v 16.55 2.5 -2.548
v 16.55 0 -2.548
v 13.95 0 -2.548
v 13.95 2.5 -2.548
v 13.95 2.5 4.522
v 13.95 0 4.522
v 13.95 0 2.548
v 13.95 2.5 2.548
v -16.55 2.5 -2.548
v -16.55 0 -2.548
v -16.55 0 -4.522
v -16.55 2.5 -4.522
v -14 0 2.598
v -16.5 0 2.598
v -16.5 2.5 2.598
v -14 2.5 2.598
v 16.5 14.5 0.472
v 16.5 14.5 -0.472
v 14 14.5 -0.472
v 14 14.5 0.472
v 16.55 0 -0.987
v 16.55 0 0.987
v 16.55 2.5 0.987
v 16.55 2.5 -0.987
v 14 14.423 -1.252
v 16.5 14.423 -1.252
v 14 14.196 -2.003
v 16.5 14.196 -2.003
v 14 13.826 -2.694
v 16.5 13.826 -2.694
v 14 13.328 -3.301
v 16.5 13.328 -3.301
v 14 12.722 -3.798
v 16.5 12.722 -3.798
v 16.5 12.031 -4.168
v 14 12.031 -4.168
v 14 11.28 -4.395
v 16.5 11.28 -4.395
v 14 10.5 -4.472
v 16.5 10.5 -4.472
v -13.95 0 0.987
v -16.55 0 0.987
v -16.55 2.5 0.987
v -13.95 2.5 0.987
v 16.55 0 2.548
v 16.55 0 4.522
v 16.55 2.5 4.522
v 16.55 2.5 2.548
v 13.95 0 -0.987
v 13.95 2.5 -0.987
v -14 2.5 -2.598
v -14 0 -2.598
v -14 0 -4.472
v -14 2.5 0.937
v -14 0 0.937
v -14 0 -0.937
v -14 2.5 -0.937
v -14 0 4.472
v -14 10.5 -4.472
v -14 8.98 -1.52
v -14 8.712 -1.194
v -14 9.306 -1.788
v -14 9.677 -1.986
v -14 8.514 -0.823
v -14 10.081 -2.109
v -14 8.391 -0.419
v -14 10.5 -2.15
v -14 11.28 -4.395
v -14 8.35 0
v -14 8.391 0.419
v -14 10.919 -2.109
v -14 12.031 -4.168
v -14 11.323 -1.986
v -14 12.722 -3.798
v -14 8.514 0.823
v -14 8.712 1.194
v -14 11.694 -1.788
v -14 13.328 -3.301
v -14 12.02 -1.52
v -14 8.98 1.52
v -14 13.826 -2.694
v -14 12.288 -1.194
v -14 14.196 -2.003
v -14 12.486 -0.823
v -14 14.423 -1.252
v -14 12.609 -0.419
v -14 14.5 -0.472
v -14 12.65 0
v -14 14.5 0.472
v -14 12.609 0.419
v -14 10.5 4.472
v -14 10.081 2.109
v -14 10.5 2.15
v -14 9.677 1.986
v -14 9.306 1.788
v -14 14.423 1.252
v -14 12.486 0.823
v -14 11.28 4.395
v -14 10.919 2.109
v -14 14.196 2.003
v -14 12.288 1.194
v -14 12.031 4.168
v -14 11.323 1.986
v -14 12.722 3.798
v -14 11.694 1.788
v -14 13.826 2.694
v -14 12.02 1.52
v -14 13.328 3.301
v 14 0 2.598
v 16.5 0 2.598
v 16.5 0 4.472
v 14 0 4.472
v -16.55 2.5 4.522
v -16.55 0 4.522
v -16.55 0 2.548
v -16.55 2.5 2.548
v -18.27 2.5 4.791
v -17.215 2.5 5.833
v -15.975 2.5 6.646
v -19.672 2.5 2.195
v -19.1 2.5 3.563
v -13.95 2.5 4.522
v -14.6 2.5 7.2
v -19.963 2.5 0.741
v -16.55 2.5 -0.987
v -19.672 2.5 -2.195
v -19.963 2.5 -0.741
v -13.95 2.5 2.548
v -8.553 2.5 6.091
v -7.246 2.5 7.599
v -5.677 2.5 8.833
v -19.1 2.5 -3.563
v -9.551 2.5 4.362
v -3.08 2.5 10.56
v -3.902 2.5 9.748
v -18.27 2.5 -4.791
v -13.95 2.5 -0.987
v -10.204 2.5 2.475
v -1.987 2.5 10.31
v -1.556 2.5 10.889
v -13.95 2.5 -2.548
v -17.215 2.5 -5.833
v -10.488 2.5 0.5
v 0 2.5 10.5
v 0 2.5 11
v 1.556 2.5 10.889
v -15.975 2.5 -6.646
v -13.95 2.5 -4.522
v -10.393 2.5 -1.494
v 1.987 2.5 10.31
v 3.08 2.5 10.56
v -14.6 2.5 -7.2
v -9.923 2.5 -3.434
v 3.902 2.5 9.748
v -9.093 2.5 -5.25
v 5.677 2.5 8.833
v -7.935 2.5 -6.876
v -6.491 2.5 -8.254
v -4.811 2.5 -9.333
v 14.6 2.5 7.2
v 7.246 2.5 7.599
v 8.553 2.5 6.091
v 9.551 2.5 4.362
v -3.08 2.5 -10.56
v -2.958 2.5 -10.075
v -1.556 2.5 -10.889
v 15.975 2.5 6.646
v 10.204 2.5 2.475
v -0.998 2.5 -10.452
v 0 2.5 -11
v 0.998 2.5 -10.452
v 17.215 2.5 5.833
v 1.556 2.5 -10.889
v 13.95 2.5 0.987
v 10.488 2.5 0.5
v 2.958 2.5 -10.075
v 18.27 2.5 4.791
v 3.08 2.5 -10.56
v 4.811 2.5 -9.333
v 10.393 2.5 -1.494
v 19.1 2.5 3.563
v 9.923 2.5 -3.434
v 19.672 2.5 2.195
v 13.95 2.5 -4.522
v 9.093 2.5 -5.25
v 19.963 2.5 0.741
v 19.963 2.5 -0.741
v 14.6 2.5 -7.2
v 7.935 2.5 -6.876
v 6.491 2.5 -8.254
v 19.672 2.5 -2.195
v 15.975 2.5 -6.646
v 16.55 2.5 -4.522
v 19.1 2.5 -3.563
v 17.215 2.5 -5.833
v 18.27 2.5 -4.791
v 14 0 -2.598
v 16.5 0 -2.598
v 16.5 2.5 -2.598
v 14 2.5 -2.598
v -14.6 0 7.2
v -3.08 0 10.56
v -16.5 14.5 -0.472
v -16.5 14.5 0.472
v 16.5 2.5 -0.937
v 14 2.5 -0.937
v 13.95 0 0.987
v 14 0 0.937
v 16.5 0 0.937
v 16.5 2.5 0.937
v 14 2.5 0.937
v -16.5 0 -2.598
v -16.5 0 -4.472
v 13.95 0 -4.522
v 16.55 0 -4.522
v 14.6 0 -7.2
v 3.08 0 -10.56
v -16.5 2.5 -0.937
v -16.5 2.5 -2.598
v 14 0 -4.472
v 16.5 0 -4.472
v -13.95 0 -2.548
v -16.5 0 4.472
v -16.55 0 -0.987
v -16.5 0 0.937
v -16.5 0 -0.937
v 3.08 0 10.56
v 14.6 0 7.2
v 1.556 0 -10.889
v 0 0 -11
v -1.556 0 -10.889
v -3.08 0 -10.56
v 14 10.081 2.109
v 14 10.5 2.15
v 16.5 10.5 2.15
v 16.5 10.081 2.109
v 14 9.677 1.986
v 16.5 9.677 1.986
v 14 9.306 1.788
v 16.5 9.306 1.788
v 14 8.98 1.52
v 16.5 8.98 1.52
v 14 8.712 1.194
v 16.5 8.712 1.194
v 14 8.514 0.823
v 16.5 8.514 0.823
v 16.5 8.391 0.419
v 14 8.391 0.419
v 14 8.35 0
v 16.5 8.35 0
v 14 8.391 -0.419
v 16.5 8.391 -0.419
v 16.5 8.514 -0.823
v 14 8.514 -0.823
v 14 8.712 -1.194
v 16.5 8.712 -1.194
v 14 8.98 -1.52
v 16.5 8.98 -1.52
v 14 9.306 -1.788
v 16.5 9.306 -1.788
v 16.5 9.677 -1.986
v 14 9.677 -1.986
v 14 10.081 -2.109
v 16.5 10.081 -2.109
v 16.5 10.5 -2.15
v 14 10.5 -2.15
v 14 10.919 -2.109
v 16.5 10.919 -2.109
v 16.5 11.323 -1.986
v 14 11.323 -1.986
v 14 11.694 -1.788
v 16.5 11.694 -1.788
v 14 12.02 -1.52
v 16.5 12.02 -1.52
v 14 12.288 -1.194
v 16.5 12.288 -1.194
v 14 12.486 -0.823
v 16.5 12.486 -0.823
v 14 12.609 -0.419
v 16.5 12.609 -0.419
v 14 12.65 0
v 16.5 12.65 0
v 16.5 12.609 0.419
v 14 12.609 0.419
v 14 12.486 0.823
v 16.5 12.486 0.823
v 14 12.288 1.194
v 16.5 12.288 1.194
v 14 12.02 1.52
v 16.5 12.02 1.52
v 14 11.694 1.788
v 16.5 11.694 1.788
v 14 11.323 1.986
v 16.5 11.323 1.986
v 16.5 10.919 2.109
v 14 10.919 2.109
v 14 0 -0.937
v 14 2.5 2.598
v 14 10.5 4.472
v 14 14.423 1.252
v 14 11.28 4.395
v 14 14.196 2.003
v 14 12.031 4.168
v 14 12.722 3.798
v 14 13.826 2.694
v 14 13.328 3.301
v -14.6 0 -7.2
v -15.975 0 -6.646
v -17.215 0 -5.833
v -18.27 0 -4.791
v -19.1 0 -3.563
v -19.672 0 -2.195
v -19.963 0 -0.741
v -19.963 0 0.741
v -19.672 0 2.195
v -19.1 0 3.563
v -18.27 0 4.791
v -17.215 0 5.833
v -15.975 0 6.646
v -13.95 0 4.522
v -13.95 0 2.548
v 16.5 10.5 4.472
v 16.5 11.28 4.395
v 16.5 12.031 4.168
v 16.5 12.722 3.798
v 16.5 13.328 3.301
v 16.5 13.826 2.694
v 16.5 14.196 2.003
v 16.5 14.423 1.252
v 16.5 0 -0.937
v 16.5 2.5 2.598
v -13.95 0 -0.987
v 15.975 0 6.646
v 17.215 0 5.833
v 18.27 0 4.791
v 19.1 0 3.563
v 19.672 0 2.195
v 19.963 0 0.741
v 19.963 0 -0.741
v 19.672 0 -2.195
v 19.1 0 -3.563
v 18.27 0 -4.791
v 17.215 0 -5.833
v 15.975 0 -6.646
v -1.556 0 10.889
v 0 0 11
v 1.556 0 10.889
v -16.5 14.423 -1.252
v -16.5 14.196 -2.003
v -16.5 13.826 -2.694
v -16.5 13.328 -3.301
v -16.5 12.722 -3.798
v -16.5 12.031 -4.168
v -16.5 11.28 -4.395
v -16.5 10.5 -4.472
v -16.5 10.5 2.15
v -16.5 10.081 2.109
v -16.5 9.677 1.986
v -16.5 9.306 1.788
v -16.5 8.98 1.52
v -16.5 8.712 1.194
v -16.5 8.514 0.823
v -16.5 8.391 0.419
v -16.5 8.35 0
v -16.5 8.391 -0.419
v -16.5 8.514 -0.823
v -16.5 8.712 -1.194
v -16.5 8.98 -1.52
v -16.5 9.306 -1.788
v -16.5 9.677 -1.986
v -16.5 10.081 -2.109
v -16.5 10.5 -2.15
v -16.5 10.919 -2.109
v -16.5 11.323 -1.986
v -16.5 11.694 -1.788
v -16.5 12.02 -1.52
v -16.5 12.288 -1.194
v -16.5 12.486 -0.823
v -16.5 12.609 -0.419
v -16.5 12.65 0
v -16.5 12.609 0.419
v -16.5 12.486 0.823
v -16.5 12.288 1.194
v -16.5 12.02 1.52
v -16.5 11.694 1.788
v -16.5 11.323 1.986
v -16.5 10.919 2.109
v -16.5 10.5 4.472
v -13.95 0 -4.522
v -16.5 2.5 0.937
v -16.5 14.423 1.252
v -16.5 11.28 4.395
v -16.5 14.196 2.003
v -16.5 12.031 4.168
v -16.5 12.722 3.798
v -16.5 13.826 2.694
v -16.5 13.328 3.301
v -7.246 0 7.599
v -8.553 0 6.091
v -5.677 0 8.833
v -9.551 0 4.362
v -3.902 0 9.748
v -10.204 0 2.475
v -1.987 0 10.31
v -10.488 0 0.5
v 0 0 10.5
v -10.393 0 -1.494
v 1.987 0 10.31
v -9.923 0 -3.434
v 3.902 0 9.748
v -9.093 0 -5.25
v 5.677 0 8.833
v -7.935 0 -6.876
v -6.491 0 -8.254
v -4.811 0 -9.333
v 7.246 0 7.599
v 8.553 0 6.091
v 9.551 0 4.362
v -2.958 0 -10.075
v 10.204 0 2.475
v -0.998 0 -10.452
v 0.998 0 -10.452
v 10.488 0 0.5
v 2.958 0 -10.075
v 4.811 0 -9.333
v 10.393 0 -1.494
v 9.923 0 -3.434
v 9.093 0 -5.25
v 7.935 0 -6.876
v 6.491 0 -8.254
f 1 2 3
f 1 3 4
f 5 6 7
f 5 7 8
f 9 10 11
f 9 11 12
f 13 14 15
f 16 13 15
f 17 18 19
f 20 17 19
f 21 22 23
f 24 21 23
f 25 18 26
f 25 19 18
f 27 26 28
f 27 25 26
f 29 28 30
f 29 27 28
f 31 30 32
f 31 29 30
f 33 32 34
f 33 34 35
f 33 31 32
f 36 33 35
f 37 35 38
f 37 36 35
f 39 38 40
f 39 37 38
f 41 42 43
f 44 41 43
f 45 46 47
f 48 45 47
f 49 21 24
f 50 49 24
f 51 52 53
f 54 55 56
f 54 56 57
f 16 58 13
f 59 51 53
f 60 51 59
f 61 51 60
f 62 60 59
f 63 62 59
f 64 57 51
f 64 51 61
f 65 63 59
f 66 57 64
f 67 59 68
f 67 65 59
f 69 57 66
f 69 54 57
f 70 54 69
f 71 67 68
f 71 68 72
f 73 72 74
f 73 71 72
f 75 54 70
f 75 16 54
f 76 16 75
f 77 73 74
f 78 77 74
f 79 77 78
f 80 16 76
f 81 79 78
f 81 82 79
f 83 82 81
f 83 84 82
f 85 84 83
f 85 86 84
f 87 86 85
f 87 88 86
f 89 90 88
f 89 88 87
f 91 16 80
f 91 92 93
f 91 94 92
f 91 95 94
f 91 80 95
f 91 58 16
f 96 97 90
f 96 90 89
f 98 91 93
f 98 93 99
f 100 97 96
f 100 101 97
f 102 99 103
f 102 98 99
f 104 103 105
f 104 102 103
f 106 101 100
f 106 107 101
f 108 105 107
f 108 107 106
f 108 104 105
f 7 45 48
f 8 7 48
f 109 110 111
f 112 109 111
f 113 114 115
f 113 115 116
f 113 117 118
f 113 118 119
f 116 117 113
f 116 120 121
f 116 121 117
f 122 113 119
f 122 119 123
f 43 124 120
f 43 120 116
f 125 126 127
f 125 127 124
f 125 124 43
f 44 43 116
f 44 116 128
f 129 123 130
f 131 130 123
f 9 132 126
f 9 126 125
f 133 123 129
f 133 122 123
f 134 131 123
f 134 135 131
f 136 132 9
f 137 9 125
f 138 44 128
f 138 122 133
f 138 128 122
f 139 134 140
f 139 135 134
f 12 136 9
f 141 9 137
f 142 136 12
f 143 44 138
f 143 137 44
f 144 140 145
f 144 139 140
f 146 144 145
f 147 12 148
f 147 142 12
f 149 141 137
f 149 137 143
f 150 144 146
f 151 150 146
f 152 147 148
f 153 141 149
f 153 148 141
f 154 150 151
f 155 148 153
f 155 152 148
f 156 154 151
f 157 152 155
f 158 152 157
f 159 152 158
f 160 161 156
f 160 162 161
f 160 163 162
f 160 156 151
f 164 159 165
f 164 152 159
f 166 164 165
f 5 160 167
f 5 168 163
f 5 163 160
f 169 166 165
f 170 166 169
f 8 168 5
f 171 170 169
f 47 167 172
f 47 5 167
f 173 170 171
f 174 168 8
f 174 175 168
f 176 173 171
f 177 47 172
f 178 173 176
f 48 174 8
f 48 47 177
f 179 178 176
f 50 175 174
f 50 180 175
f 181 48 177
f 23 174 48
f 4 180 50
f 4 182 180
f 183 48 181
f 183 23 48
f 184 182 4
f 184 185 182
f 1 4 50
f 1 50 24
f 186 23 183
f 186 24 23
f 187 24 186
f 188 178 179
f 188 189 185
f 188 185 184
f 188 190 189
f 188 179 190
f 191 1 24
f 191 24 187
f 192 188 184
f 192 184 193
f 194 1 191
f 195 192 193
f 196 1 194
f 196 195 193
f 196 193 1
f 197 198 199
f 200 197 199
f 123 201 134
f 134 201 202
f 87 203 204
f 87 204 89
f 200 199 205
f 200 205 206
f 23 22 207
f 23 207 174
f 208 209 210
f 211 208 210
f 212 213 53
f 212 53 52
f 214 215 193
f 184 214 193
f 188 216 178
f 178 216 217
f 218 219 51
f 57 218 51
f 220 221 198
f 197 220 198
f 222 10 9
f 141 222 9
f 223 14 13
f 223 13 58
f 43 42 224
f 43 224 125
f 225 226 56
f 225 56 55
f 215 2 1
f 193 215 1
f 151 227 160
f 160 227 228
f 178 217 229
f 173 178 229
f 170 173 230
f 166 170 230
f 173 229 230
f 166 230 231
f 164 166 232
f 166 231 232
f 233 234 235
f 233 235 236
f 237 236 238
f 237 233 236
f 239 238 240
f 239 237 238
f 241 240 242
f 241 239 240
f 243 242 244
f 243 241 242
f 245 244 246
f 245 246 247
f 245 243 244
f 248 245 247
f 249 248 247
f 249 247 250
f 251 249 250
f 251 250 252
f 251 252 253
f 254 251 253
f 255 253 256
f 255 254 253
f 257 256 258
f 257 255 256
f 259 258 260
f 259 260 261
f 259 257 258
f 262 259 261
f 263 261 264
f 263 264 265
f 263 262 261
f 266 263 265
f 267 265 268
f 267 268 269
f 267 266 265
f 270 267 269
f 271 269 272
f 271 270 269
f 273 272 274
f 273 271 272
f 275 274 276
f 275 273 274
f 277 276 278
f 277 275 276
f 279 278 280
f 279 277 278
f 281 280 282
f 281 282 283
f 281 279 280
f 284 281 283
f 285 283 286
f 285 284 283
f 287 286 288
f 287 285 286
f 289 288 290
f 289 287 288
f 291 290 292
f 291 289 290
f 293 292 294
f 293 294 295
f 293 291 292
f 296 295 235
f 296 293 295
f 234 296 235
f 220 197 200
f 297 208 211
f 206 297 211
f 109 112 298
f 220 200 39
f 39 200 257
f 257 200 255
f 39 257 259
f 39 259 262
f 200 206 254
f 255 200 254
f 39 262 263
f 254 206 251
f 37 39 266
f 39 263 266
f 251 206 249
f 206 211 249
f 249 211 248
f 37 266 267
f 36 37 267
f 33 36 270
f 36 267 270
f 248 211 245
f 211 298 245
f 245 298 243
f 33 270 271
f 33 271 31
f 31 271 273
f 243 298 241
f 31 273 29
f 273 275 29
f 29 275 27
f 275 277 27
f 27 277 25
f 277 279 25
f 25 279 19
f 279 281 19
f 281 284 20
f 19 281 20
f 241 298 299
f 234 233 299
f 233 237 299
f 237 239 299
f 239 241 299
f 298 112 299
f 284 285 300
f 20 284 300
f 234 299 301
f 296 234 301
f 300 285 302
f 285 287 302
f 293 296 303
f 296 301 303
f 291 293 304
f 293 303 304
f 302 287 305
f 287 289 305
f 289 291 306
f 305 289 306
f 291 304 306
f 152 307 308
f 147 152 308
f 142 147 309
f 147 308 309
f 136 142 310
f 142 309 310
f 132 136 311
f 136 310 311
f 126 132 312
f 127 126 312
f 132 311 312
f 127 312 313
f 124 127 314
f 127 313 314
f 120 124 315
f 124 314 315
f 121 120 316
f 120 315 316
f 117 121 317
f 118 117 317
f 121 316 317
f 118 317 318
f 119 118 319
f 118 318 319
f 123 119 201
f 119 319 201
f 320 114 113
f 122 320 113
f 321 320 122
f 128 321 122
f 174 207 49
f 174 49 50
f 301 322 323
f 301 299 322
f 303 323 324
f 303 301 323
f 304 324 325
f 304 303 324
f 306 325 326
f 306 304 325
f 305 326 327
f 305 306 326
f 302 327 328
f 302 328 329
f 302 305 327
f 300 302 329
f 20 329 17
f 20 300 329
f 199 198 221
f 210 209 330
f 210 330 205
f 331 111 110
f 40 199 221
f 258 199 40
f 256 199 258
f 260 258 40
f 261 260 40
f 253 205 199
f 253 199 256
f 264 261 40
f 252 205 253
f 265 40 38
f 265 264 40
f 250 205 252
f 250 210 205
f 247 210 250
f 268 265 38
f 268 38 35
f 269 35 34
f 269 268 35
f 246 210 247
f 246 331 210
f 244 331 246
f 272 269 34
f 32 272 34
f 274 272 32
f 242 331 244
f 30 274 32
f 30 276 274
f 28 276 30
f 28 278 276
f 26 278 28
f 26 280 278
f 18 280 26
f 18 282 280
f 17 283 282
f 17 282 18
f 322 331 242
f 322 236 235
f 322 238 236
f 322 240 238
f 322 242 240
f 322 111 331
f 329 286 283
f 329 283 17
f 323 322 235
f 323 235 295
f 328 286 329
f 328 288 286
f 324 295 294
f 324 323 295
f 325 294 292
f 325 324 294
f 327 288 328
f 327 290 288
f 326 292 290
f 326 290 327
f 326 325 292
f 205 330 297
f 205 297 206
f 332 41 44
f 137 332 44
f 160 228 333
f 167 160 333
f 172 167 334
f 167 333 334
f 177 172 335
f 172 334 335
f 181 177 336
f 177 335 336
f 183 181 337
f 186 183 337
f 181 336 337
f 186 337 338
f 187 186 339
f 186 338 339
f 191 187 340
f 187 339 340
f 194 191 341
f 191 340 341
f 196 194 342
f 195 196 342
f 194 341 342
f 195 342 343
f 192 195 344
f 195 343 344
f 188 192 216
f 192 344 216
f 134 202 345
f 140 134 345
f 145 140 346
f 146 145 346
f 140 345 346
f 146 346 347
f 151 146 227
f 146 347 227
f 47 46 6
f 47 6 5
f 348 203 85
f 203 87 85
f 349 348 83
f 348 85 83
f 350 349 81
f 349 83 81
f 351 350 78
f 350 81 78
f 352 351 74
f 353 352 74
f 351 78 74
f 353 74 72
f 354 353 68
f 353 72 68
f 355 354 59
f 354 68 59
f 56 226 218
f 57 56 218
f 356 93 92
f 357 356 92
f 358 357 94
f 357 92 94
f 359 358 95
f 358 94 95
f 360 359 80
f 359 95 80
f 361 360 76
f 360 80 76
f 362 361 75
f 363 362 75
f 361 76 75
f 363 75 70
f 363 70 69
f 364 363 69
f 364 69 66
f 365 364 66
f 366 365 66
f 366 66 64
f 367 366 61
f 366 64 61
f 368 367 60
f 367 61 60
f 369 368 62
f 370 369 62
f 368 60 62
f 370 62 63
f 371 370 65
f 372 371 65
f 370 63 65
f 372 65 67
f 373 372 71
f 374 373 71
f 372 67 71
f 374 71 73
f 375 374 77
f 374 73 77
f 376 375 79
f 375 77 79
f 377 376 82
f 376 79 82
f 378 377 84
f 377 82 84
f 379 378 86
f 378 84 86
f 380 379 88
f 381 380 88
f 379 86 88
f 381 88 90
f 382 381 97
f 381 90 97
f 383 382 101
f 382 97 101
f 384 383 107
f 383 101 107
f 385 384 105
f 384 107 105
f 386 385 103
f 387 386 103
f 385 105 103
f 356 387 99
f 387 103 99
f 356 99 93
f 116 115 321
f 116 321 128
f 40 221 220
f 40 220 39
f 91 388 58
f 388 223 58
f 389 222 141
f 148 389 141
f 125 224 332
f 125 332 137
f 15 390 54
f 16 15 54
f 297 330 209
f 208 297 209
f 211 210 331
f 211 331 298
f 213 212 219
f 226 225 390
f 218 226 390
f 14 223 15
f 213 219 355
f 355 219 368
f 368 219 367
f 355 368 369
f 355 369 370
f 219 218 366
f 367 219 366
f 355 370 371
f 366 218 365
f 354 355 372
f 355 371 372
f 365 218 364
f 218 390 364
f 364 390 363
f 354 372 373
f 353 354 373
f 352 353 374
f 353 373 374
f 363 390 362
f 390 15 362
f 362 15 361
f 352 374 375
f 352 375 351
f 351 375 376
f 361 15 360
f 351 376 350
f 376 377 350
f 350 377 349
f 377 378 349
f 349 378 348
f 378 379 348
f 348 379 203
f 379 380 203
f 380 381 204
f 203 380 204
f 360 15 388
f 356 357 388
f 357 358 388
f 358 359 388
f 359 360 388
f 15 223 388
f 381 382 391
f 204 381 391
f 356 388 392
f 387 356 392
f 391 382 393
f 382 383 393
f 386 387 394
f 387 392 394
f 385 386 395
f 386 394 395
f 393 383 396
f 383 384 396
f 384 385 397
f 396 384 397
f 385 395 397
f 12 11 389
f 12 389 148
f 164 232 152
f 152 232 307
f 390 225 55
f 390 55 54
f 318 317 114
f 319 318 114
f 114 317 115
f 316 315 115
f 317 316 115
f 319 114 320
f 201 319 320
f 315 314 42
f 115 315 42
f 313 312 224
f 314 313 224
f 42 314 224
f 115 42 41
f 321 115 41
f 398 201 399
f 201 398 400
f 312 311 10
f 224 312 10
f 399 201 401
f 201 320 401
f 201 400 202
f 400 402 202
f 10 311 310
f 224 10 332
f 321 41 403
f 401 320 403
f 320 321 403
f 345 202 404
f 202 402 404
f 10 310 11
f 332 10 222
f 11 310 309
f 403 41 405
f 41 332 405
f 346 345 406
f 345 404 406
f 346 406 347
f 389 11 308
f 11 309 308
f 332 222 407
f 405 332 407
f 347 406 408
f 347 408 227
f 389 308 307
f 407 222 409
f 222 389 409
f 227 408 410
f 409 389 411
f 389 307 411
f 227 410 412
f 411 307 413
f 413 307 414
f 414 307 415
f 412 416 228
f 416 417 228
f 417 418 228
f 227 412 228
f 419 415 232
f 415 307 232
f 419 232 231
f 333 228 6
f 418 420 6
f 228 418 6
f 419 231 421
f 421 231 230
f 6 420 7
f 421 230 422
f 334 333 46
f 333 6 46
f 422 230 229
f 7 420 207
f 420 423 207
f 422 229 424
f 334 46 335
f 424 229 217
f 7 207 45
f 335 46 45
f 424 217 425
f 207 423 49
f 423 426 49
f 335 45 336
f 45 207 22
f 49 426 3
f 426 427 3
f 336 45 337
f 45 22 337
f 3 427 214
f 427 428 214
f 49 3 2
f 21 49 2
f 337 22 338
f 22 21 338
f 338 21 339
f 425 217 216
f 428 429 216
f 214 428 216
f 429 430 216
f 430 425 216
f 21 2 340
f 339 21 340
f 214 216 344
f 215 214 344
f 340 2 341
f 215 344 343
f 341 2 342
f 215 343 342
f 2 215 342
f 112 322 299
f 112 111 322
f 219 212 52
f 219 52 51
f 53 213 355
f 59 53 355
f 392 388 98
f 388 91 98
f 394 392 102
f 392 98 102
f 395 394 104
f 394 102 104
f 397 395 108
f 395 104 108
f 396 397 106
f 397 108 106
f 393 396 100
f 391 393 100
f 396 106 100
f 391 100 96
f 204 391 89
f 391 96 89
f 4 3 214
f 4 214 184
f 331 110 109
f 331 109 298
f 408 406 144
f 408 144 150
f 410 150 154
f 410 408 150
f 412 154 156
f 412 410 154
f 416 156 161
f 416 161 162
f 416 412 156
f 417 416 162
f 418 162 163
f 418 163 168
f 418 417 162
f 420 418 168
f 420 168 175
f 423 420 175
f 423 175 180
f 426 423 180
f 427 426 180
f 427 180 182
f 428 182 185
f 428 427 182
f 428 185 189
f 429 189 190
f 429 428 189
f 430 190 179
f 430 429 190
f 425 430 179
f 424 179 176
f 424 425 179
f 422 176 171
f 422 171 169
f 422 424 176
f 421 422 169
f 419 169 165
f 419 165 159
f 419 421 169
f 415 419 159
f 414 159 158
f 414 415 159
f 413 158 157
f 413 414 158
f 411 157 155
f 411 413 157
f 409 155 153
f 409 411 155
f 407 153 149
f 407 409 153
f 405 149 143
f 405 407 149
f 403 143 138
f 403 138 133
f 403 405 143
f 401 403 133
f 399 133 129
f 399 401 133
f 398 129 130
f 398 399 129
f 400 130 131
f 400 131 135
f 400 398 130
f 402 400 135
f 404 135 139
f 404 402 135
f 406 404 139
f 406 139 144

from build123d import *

# Parameters (mm, degrees)
SKETCH1_R                    = 10.5
BOSS_EXTRUDE1_DEPTH          = 2.5
SKETCH2_W                    = 2.5
SKETCH2_H                    = 8.94427191
BOSS_EXTRUDE2_DEPTH          = 12
SKETCH5_W                    = 2.15
SKETCH5_H                    = 36.5
FILLET1_R                    = 4
TAB_START                    = -16.5
TAB_AND_SLOT_TAB1_OUTLINE_W  = 2.5
TAB_AND_SLOT_TAB1_OUTLINE_H  = 1.874
TAB_AND_SLOT_TAB1_DEPTH      = 2.5
TAB_START_2                  = -16.55
TAB_AND_SLOT_SLOT1_OUTLINE_W = 2.5
TAB_AND_SLOT_SLOT1_OUTLINE_H = 1.974
TAB_AND_SLOT_SLOT1_DEPTH     = 2.6


# Read off the part's stored shape, not the designer's step: Tab and Slot-Tab1, Tab and Slot-Slot1
with BuildPart() as part:
    # Sketch1 → Boss-Extrude1 (new body)
    with BuildSketch(Plane(origin=(0, 0, 0), x_dir=(1, 0, 0), z_dir=(0, 1, 0))):
        with BuildLine():
            Line((14.6, 7.2), (3.08, 10.56))
            ThreePointArc((3.08, 10.56), (0, 11), (-3.08, 10.56))
            Line((-3.08, 10.56), (-14.6, 7.2))
            ThreePointArc((-14.6, 7.2), (-20, 0), (-14.6, -7.2))
            Line((-14.6, -7.2), (-3.08, -10.56))
            ThreePointArc((-3.08, -10.56), (0, -11), (3.08, -10.56))
            Line((3.08, -10.56), (14.6, -7.2))
            ThreePointArc((14.6, -7.2), (20, 0), (14.6, 7.2))
        make_face()
        with Locations(Location((0, 0, 0), (0, 0, 270))):
            Circle(SKETCH1_R, mode=Mode.SUBTRACT)
    extrude(amount=BOSS_EXTRUDE1_DEPTH)

    # Tab and Slot-Slot1 outline → Tab and Slot-Slot1 (cut)
    with BuildSketch(Plane.YZ.offset(TAB_START_2)):
        with Locations((1.25, 3.535135955)):
            Rectangle(TAB_AND_SLOT_SLOT1_OUTLINE_W, TAB_AND_SLOT_SLOT1_OUTLINE_H)
        with Locations((1.25, 0)):
            Rectangle(TAB_AND_SLOT_SLOT1_OUTLINE_W, TAB_AND_SLOT_SLOT1_OUTLINE_H)
        with Locations((1.25, -3.535135955)):
            Rectangle(TAB_AND_SLOT_SLOT1_OUTLINE_W, TAB_AND_SLOT_SLOT1_OUTLINE_H)
    tab_and_slot_slot1 = extrude(amount=TAB_AND_SLOT_SLOT1_DEPTH, mode=Mode.SUBTRACT)

    # Mirror1: Tab and Slot-Slot1 across plane
    add(tab_and_slot_slot1.mirror(Plane(origin=(0, 0, 0), x_dir=(0, 0, 1), z_dir=(1, 0, 0))), mode=Mode.SUBTRACT)


with BuildPart() as body_2:
    # Sketch2 → Boss-Extrude2 (new body)
    with BuildSketch(Plane(origin=(0, 2.5, 0), x_dir=(1, 0, 0), z_dir=(0, 1, 0))):
        with Locations((-15.25, 0)):
            Rectangle(SKETCH2_W, SKETCH2_H)
    extrude(amount=BOSS_EXTRUDE2_DEPTH)

    # Sketch5 → M4 Clearance Hole1 (revolve, cut)
    with BuildSketch(Plane(origin=(-16.5, 10.5, 0), x_dir=(0, 0, 1), z_dir=(0, 1, 0))):
        with Locations((1.075, 18.25)):
            Rectangle(SKETCH5_W, SKETCH5_H)
    revolve(axis=Axis((-22.85, 10.5, 0), (1, 0, 0)), mode=Mode.SUBTRACT)

    # Fillet1
    fillet1_edges = [body_2.edges().sort_by_distance(p)[0] for p in [
        (-15.25, 14.5, -4.472135955),
        (-15.25, 14.5, 4.472135955),
    ]]
    fillet(fillet1_edges, radius=FILLET1_R)

    # Tab and Slot-Tab1 outline → Tab and Slot-Tab1 (add)
    with BuildSketch(Plane.YZ.offset(TAB_START)):
        with Locations((1.25, -3.535135955)):
            Rectangle(TAB_AND_SLOT_TAB1_OUTLINE_W, TAB_AND_SLOT_TAB1_OUTLINE_H)
        with Locations((1.25, 3.535135955)):
            Rectangle(TAB_AND_SLOT_TAB1_OUTLINE_W, TAB_AND_SLOT_TAB1_OUTLINE_H)
        with Locations((1.25, 0)):
            Rectangle(TAB_AND_SLOT_TAB1_OUTLINE_W, TAB_AND_SLOT_TAB1_OUTLINE_H)
    extrude(amount=TAB_AND_SLOT_TAB1_DEPTH)


with BuildPart() as body_3:
    # Mirror2: mirrored copy
    add(body_2.part.mirror(Plane(origin=(0, 0, 0), x_dir=(0, 0, 1), z_dir=(1, 0, 0))))


solid = Compound([part.part, body_2.part, body_3.part])
